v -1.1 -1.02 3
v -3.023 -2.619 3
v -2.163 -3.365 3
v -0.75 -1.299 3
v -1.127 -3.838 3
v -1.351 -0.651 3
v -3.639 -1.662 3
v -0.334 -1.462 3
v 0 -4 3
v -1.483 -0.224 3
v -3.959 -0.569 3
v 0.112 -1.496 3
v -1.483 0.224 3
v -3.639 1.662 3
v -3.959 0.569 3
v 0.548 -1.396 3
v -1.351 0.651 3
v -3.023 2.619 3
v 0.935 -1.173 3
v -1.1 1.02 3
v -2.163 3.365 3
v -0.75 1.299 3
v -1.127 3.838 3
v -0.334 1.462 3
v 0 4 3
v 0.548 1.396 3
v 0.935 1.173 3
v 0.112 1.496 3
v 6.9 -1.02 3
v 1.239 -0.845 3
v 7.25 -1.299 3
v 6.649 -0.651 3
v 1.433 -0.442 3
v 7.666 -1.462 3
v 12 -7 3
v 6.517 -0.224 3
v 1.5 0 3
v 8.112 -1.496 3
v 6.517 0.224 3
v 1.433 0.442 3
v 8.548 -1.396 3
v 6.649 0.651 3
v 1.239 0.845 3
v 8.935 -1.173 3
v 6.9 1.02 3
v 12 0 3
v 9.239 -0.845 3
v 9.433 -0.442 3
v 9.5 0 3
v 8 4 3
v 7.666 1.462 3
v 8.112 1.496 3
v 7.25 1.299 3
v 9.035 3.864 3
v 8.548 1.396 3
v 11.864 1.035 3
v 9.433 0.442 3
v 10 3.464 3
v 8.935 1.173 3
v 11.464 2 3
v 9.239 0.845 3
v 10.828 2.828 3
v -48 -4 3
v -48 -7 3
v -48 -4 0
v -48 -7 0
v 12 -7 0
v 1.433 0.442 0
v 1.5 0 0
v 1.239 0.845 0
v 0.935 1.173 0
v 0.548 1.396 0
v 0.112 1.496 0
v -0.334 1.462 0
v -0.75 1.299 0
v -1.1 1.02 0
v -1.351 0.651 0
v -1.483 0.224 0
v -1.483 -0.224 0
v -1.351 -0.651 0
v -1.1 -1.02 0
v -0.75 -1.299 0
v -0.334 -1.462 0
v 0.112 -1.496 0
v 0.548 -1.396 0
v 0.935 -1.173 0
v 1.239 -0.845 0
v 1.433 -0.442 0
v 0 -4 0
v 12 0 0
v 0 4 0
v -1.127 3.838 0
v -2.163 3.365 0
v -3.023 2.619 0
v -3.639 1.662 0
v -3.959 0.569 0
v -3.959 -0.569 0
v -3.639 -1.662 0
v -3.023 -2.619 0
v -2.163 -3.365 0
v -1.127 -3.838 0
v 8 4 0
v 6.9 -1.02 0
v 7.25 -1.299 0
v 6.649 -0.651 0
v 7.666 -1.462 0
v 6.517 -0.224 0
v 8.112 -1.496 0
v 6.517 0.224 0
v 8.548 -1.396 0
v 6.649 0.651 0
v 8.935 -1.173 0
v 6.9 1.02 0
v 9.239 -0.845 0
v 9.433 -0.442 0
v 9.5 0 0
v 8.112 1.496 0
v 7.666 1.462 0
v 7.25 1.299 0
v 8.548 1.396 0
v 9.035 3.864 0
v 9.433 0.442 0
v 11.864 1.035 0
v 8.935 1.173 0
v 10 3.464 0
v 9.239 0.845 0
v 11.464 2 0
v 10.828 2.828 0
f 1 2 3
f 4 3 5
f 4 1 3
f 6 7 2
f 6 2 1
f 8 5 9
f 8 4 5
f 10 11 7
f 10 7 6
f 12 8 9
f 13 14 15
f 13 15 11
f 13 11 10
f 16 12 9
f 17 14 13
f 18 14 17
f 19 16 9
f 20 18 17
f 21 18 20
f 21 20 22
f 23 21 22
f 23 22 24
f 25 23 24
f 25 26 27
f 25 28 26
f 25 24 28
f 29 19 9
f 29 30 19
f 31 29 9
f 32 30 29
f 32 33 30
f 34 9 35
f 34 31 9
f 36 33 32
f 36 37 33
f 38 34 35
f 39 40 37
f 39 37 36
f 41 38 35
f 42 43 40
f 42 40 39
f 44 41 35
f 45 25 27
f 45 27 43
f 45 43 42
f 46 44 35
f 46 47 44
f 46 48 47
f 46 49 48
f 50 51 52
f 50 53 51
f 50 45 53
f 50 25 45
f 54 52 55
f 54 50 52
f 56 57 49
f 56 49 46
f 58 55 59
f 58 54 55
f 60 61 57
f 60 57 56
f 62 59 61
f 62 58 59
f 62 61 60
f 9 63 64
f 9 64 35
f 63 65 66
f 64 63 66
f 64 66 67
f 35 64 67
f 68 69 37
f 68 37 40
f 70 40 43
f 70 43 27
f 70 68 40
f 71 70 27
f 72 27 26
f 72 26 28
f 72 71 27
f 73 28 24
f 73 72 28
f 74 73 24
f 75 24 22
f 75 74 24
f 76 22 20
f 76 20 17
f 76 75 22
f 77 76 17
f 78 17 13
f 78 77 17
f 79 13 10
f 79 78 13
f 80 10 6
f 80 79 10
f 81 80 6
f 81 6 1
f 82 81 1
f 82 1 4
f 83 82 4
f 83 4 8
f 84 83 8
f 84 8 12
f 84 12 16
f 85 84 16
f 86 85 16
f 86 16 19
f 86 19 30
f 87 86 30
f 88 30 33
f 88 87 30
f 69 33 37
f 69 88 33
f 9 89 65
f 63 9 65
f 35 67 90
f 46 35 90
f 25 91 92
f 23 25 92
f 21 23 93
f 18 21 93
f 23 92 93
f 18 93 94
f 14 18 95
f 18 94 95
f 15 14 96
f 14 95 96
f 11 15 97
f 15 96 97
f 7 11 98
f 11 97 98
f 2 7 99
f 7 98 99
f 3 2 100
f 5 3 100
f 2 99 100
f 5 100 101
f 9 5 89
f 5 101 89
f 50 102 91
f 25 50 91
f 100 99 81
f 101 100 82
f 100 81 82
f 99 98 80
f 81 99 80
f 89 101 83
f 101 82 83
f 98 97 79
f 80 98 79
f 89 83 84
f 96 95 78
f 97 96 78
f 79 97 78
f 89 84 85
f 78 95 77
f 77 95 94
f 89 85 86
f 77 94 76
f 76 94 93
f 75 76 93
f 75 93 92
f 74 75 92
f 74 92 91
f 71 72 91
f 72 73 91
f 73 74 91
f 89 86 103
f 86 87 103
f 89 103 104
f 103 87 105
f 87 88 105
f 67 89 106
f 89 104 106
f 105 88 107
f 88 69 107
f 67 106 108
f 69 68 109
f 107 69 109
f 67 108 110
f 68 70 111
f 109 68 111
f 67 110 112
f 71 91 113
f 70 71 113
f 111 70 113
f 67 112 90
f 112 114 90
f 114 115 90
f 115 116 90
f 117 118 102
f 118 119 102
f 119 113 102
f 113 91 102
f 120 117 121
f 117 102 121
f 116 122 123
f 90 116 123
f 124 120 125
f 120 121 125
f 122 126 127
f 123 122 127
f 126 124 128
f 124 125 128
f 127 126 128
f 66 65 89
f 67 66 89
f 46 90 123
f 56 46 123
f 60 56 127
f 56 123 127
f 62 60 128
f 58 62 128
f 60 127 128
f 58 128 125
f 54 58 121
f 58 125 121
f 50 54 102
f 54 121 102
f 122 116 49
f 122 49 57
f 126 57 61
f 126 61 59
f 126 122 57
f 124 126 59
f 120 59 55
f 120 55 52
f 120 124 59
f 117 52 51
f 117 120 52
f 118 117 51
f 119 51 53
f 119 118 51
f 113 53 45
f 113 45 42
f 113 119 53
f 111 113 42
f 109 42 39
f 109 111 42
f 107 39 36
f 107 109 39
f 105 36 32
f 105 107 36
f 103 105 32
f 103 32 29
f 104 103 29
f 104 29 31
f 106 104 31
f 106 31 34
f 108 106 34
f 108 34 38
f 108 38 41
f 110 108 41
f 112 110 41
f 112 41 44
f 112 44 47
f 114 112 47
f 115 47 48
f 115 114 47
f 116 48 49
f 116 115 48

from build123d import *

# Parameters (mm, degrees)
CROQUIS1_R              = 1.5
SALIENTE_EXTRUIR1_DEPTH = 3


with BuildPart() as part:
    # Croquis1 → Saliente-Extruir1 (new body)
    with BuildSketch(Plane.XY):
        with BuildLine():
            Line((0, -4), (-48, -4))
            Line((-48, -4), (-48, -7))
            Line((-48, -7), (12, -7))
            Line((12, -7), (12, 0))
            ThreePointArc((12, 0), (10.828427125, 2.828427125), (8, 4))
            Line((8, 4), (0, 4))
            ThreePointArc((0, 4), (-4, 0), (0, -4))
        make_face()
        Circle(CROQUIS1_R, mode=Mode.SUBTRACT)
        with Locations((8, 0)):
            Circle(CROQUIS1_R, mode=Mode.SUBTRACT)
    extrude(amount=SALIENTE_EXTRUIR1_DEPTH)


solid = part.part
